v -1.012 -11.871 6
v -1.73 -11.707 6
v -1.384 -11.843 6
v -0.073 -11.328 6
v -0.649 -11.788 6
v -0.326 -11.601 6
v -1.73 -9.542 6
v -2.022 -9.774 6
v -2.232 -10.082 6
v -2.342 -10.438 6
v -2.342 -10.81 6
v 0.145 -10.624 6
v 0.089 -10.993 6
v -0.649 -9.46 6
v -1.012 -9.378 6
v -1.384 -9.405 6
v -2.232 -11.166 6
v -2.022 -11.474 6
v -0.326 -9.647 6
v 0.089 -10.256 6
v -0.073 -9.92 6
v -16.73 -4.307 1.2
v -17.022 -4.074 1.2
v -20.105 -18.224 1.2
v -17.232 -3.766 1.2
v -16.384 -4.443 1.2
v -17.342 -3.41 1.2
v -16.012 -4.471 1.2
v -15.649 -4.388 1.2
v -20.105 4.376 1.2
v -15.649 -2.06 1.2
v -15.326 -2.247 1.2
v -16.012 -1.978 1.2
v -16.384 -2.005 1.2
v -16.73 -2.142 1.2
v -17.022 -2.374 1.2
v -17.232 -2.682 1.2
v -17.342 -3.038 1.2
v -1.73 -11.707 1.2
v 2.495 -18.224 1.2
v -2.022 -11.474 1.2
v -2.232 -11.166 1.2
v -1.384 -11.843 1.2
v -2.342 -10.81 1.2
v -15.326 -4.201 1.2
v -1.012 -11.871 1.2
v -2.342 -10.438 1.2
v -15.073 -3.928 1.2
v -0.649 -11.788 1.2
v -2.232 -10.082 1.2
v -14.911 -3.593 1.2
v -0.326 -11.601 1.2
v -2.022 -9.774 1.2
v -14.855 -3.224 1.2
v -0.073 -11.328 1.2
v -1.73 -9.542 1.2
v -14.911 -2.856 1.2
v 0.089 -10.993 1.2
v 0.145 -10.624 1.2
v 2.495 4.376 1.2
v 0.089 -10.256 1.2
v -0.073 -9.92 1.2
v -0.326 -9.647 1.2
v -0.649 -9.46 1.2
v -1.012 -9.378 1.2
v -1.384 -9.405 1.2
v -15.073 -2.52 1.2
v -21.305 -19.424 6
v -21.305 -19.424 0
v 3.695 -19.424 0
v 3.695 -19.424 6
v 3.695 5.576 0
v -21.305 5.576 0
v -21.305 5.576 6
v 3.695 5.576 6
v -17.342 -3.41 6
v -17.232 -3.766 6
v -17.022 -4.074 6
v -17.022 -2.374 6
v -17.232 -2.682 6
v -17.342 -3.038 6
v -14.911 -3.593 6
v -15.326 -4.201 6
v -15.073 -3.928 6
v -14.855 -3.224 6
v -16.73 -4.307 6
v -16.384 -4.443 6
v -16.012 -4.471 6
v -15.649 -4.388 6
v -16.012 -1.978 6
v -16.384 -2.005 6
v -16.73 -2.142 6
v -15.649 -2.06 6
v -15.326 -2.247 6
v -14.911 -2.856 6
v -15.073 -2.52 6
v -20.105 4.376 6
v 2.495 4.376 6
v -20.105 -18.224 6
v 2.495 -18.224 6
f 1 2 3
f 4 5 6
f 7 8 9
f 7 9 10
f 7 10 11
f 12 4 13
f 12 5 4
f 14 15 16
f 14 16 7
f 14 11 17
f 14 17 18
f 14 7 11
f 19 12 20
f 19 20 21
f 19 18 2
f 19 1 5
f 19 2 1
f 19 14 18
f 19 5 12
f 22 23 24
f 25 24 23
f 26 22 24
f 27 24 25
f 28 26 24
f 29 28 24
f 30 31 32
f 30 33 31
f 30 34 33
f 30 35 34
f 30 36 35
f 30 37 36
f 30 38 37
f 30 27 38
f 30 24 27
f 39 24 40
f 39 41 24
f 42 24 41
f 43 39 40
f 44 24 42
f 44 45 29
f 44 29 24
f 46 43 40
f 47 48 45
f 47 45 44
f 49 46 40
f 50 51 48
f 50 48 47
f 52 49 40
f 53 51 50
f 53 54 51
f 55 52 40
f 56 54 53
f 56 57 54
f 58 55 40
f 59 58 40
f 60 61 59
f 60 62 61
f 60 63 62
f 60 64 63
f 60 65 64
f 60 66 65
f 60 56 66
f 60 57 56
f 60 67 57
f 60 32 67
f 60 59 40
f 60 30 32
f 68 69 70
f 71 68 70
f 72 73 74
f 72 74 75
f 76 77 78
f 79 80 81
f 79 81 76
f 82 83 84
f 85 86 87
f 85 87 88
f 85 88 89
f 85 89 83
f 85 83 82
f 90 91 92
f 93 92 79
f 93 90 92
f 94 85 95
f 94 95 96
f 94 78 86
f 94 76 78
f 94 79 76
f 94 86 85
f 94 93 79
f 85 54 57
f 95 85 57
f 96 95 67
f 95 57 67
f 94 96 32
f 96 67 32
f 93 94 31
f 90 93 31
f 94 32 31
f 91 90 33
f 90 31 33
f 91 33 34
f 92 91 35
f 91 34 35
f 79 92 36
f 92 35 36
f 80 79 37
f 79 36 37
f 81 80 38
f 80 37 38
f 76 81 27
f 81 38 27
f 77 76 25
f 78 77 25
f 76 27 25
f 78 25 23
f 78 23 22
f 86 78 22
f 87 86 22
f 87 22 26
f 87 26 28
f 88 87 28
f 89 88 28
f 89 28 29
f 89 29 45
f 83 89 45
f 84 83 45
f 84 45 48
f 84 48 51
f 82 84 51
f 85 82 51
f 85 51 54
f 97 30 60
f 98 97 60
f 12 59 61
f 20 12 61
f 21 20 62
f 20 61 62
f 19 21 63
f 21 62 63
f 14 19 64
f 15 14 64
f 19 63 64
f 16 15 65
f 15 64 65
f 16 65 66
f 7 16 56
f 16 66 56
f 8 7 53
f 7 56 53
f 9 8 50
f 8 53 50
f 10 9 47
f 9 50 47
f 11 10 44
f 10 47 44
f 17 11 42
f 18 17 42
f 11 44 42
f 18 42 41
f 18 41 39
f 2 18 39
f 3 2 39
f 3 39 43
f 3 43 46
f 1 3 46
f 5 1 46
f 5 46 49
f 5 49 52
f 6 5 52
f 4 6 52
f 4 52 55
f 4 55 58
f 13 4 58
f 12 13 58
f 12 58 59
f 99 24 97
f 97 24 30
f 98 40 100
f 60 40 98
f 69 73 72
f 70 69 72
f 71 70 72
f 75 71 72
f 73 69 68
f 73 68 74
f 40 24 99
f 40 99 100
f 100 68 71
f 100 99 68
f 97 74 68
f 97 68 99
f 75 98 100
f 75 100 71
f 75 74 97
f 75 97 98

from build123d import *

# Parameters (mm, degrees)
F0_W     = 22.6
F0_H     = 22.6
F0_R     = 1.25
F1_DEPTH = 1.2
F0_W_2   = 25
F0_H_2   = 25
F2_DEPTH = 6


with BuildPart() as f1:
    # F0 (on Top) → F1 (new body)
    with BuildSketch(Plane.XY):
        with Locations((-8.805462, -6.924062)):
            Rectangle(F0_W, F0_H)
        with Locations((-1.105462, -10.624062)):
            Circle(F0_R, mode=Mode.SUBTRACT)
        with Locations((-16.105462, -3.224062)):
            Circle(F0_R, mode=Mode.SUBTRACT)
    extrude(amount=F1_DEPTH)

    # F0 (on Top) → F2 (join)
    with BuildSketch(Plane.XY):
        with Locations((-8.805462, -6.924062)):
            Rectangle(F0_W_2, F0_H_2)
        with Locations((-8.805462, -6.924062)):
            Rectangle(F0_W, F0_H, mode=Mode.SUBTRACT)
        with Locations((-16.105462, -3.224062)):
            Circle(F0_R)
        with Locations((-1.105462, -10.624062)):
            Circle(F0_R)
    extrude(amount=F2_DEPTH)


solid = f1.part
